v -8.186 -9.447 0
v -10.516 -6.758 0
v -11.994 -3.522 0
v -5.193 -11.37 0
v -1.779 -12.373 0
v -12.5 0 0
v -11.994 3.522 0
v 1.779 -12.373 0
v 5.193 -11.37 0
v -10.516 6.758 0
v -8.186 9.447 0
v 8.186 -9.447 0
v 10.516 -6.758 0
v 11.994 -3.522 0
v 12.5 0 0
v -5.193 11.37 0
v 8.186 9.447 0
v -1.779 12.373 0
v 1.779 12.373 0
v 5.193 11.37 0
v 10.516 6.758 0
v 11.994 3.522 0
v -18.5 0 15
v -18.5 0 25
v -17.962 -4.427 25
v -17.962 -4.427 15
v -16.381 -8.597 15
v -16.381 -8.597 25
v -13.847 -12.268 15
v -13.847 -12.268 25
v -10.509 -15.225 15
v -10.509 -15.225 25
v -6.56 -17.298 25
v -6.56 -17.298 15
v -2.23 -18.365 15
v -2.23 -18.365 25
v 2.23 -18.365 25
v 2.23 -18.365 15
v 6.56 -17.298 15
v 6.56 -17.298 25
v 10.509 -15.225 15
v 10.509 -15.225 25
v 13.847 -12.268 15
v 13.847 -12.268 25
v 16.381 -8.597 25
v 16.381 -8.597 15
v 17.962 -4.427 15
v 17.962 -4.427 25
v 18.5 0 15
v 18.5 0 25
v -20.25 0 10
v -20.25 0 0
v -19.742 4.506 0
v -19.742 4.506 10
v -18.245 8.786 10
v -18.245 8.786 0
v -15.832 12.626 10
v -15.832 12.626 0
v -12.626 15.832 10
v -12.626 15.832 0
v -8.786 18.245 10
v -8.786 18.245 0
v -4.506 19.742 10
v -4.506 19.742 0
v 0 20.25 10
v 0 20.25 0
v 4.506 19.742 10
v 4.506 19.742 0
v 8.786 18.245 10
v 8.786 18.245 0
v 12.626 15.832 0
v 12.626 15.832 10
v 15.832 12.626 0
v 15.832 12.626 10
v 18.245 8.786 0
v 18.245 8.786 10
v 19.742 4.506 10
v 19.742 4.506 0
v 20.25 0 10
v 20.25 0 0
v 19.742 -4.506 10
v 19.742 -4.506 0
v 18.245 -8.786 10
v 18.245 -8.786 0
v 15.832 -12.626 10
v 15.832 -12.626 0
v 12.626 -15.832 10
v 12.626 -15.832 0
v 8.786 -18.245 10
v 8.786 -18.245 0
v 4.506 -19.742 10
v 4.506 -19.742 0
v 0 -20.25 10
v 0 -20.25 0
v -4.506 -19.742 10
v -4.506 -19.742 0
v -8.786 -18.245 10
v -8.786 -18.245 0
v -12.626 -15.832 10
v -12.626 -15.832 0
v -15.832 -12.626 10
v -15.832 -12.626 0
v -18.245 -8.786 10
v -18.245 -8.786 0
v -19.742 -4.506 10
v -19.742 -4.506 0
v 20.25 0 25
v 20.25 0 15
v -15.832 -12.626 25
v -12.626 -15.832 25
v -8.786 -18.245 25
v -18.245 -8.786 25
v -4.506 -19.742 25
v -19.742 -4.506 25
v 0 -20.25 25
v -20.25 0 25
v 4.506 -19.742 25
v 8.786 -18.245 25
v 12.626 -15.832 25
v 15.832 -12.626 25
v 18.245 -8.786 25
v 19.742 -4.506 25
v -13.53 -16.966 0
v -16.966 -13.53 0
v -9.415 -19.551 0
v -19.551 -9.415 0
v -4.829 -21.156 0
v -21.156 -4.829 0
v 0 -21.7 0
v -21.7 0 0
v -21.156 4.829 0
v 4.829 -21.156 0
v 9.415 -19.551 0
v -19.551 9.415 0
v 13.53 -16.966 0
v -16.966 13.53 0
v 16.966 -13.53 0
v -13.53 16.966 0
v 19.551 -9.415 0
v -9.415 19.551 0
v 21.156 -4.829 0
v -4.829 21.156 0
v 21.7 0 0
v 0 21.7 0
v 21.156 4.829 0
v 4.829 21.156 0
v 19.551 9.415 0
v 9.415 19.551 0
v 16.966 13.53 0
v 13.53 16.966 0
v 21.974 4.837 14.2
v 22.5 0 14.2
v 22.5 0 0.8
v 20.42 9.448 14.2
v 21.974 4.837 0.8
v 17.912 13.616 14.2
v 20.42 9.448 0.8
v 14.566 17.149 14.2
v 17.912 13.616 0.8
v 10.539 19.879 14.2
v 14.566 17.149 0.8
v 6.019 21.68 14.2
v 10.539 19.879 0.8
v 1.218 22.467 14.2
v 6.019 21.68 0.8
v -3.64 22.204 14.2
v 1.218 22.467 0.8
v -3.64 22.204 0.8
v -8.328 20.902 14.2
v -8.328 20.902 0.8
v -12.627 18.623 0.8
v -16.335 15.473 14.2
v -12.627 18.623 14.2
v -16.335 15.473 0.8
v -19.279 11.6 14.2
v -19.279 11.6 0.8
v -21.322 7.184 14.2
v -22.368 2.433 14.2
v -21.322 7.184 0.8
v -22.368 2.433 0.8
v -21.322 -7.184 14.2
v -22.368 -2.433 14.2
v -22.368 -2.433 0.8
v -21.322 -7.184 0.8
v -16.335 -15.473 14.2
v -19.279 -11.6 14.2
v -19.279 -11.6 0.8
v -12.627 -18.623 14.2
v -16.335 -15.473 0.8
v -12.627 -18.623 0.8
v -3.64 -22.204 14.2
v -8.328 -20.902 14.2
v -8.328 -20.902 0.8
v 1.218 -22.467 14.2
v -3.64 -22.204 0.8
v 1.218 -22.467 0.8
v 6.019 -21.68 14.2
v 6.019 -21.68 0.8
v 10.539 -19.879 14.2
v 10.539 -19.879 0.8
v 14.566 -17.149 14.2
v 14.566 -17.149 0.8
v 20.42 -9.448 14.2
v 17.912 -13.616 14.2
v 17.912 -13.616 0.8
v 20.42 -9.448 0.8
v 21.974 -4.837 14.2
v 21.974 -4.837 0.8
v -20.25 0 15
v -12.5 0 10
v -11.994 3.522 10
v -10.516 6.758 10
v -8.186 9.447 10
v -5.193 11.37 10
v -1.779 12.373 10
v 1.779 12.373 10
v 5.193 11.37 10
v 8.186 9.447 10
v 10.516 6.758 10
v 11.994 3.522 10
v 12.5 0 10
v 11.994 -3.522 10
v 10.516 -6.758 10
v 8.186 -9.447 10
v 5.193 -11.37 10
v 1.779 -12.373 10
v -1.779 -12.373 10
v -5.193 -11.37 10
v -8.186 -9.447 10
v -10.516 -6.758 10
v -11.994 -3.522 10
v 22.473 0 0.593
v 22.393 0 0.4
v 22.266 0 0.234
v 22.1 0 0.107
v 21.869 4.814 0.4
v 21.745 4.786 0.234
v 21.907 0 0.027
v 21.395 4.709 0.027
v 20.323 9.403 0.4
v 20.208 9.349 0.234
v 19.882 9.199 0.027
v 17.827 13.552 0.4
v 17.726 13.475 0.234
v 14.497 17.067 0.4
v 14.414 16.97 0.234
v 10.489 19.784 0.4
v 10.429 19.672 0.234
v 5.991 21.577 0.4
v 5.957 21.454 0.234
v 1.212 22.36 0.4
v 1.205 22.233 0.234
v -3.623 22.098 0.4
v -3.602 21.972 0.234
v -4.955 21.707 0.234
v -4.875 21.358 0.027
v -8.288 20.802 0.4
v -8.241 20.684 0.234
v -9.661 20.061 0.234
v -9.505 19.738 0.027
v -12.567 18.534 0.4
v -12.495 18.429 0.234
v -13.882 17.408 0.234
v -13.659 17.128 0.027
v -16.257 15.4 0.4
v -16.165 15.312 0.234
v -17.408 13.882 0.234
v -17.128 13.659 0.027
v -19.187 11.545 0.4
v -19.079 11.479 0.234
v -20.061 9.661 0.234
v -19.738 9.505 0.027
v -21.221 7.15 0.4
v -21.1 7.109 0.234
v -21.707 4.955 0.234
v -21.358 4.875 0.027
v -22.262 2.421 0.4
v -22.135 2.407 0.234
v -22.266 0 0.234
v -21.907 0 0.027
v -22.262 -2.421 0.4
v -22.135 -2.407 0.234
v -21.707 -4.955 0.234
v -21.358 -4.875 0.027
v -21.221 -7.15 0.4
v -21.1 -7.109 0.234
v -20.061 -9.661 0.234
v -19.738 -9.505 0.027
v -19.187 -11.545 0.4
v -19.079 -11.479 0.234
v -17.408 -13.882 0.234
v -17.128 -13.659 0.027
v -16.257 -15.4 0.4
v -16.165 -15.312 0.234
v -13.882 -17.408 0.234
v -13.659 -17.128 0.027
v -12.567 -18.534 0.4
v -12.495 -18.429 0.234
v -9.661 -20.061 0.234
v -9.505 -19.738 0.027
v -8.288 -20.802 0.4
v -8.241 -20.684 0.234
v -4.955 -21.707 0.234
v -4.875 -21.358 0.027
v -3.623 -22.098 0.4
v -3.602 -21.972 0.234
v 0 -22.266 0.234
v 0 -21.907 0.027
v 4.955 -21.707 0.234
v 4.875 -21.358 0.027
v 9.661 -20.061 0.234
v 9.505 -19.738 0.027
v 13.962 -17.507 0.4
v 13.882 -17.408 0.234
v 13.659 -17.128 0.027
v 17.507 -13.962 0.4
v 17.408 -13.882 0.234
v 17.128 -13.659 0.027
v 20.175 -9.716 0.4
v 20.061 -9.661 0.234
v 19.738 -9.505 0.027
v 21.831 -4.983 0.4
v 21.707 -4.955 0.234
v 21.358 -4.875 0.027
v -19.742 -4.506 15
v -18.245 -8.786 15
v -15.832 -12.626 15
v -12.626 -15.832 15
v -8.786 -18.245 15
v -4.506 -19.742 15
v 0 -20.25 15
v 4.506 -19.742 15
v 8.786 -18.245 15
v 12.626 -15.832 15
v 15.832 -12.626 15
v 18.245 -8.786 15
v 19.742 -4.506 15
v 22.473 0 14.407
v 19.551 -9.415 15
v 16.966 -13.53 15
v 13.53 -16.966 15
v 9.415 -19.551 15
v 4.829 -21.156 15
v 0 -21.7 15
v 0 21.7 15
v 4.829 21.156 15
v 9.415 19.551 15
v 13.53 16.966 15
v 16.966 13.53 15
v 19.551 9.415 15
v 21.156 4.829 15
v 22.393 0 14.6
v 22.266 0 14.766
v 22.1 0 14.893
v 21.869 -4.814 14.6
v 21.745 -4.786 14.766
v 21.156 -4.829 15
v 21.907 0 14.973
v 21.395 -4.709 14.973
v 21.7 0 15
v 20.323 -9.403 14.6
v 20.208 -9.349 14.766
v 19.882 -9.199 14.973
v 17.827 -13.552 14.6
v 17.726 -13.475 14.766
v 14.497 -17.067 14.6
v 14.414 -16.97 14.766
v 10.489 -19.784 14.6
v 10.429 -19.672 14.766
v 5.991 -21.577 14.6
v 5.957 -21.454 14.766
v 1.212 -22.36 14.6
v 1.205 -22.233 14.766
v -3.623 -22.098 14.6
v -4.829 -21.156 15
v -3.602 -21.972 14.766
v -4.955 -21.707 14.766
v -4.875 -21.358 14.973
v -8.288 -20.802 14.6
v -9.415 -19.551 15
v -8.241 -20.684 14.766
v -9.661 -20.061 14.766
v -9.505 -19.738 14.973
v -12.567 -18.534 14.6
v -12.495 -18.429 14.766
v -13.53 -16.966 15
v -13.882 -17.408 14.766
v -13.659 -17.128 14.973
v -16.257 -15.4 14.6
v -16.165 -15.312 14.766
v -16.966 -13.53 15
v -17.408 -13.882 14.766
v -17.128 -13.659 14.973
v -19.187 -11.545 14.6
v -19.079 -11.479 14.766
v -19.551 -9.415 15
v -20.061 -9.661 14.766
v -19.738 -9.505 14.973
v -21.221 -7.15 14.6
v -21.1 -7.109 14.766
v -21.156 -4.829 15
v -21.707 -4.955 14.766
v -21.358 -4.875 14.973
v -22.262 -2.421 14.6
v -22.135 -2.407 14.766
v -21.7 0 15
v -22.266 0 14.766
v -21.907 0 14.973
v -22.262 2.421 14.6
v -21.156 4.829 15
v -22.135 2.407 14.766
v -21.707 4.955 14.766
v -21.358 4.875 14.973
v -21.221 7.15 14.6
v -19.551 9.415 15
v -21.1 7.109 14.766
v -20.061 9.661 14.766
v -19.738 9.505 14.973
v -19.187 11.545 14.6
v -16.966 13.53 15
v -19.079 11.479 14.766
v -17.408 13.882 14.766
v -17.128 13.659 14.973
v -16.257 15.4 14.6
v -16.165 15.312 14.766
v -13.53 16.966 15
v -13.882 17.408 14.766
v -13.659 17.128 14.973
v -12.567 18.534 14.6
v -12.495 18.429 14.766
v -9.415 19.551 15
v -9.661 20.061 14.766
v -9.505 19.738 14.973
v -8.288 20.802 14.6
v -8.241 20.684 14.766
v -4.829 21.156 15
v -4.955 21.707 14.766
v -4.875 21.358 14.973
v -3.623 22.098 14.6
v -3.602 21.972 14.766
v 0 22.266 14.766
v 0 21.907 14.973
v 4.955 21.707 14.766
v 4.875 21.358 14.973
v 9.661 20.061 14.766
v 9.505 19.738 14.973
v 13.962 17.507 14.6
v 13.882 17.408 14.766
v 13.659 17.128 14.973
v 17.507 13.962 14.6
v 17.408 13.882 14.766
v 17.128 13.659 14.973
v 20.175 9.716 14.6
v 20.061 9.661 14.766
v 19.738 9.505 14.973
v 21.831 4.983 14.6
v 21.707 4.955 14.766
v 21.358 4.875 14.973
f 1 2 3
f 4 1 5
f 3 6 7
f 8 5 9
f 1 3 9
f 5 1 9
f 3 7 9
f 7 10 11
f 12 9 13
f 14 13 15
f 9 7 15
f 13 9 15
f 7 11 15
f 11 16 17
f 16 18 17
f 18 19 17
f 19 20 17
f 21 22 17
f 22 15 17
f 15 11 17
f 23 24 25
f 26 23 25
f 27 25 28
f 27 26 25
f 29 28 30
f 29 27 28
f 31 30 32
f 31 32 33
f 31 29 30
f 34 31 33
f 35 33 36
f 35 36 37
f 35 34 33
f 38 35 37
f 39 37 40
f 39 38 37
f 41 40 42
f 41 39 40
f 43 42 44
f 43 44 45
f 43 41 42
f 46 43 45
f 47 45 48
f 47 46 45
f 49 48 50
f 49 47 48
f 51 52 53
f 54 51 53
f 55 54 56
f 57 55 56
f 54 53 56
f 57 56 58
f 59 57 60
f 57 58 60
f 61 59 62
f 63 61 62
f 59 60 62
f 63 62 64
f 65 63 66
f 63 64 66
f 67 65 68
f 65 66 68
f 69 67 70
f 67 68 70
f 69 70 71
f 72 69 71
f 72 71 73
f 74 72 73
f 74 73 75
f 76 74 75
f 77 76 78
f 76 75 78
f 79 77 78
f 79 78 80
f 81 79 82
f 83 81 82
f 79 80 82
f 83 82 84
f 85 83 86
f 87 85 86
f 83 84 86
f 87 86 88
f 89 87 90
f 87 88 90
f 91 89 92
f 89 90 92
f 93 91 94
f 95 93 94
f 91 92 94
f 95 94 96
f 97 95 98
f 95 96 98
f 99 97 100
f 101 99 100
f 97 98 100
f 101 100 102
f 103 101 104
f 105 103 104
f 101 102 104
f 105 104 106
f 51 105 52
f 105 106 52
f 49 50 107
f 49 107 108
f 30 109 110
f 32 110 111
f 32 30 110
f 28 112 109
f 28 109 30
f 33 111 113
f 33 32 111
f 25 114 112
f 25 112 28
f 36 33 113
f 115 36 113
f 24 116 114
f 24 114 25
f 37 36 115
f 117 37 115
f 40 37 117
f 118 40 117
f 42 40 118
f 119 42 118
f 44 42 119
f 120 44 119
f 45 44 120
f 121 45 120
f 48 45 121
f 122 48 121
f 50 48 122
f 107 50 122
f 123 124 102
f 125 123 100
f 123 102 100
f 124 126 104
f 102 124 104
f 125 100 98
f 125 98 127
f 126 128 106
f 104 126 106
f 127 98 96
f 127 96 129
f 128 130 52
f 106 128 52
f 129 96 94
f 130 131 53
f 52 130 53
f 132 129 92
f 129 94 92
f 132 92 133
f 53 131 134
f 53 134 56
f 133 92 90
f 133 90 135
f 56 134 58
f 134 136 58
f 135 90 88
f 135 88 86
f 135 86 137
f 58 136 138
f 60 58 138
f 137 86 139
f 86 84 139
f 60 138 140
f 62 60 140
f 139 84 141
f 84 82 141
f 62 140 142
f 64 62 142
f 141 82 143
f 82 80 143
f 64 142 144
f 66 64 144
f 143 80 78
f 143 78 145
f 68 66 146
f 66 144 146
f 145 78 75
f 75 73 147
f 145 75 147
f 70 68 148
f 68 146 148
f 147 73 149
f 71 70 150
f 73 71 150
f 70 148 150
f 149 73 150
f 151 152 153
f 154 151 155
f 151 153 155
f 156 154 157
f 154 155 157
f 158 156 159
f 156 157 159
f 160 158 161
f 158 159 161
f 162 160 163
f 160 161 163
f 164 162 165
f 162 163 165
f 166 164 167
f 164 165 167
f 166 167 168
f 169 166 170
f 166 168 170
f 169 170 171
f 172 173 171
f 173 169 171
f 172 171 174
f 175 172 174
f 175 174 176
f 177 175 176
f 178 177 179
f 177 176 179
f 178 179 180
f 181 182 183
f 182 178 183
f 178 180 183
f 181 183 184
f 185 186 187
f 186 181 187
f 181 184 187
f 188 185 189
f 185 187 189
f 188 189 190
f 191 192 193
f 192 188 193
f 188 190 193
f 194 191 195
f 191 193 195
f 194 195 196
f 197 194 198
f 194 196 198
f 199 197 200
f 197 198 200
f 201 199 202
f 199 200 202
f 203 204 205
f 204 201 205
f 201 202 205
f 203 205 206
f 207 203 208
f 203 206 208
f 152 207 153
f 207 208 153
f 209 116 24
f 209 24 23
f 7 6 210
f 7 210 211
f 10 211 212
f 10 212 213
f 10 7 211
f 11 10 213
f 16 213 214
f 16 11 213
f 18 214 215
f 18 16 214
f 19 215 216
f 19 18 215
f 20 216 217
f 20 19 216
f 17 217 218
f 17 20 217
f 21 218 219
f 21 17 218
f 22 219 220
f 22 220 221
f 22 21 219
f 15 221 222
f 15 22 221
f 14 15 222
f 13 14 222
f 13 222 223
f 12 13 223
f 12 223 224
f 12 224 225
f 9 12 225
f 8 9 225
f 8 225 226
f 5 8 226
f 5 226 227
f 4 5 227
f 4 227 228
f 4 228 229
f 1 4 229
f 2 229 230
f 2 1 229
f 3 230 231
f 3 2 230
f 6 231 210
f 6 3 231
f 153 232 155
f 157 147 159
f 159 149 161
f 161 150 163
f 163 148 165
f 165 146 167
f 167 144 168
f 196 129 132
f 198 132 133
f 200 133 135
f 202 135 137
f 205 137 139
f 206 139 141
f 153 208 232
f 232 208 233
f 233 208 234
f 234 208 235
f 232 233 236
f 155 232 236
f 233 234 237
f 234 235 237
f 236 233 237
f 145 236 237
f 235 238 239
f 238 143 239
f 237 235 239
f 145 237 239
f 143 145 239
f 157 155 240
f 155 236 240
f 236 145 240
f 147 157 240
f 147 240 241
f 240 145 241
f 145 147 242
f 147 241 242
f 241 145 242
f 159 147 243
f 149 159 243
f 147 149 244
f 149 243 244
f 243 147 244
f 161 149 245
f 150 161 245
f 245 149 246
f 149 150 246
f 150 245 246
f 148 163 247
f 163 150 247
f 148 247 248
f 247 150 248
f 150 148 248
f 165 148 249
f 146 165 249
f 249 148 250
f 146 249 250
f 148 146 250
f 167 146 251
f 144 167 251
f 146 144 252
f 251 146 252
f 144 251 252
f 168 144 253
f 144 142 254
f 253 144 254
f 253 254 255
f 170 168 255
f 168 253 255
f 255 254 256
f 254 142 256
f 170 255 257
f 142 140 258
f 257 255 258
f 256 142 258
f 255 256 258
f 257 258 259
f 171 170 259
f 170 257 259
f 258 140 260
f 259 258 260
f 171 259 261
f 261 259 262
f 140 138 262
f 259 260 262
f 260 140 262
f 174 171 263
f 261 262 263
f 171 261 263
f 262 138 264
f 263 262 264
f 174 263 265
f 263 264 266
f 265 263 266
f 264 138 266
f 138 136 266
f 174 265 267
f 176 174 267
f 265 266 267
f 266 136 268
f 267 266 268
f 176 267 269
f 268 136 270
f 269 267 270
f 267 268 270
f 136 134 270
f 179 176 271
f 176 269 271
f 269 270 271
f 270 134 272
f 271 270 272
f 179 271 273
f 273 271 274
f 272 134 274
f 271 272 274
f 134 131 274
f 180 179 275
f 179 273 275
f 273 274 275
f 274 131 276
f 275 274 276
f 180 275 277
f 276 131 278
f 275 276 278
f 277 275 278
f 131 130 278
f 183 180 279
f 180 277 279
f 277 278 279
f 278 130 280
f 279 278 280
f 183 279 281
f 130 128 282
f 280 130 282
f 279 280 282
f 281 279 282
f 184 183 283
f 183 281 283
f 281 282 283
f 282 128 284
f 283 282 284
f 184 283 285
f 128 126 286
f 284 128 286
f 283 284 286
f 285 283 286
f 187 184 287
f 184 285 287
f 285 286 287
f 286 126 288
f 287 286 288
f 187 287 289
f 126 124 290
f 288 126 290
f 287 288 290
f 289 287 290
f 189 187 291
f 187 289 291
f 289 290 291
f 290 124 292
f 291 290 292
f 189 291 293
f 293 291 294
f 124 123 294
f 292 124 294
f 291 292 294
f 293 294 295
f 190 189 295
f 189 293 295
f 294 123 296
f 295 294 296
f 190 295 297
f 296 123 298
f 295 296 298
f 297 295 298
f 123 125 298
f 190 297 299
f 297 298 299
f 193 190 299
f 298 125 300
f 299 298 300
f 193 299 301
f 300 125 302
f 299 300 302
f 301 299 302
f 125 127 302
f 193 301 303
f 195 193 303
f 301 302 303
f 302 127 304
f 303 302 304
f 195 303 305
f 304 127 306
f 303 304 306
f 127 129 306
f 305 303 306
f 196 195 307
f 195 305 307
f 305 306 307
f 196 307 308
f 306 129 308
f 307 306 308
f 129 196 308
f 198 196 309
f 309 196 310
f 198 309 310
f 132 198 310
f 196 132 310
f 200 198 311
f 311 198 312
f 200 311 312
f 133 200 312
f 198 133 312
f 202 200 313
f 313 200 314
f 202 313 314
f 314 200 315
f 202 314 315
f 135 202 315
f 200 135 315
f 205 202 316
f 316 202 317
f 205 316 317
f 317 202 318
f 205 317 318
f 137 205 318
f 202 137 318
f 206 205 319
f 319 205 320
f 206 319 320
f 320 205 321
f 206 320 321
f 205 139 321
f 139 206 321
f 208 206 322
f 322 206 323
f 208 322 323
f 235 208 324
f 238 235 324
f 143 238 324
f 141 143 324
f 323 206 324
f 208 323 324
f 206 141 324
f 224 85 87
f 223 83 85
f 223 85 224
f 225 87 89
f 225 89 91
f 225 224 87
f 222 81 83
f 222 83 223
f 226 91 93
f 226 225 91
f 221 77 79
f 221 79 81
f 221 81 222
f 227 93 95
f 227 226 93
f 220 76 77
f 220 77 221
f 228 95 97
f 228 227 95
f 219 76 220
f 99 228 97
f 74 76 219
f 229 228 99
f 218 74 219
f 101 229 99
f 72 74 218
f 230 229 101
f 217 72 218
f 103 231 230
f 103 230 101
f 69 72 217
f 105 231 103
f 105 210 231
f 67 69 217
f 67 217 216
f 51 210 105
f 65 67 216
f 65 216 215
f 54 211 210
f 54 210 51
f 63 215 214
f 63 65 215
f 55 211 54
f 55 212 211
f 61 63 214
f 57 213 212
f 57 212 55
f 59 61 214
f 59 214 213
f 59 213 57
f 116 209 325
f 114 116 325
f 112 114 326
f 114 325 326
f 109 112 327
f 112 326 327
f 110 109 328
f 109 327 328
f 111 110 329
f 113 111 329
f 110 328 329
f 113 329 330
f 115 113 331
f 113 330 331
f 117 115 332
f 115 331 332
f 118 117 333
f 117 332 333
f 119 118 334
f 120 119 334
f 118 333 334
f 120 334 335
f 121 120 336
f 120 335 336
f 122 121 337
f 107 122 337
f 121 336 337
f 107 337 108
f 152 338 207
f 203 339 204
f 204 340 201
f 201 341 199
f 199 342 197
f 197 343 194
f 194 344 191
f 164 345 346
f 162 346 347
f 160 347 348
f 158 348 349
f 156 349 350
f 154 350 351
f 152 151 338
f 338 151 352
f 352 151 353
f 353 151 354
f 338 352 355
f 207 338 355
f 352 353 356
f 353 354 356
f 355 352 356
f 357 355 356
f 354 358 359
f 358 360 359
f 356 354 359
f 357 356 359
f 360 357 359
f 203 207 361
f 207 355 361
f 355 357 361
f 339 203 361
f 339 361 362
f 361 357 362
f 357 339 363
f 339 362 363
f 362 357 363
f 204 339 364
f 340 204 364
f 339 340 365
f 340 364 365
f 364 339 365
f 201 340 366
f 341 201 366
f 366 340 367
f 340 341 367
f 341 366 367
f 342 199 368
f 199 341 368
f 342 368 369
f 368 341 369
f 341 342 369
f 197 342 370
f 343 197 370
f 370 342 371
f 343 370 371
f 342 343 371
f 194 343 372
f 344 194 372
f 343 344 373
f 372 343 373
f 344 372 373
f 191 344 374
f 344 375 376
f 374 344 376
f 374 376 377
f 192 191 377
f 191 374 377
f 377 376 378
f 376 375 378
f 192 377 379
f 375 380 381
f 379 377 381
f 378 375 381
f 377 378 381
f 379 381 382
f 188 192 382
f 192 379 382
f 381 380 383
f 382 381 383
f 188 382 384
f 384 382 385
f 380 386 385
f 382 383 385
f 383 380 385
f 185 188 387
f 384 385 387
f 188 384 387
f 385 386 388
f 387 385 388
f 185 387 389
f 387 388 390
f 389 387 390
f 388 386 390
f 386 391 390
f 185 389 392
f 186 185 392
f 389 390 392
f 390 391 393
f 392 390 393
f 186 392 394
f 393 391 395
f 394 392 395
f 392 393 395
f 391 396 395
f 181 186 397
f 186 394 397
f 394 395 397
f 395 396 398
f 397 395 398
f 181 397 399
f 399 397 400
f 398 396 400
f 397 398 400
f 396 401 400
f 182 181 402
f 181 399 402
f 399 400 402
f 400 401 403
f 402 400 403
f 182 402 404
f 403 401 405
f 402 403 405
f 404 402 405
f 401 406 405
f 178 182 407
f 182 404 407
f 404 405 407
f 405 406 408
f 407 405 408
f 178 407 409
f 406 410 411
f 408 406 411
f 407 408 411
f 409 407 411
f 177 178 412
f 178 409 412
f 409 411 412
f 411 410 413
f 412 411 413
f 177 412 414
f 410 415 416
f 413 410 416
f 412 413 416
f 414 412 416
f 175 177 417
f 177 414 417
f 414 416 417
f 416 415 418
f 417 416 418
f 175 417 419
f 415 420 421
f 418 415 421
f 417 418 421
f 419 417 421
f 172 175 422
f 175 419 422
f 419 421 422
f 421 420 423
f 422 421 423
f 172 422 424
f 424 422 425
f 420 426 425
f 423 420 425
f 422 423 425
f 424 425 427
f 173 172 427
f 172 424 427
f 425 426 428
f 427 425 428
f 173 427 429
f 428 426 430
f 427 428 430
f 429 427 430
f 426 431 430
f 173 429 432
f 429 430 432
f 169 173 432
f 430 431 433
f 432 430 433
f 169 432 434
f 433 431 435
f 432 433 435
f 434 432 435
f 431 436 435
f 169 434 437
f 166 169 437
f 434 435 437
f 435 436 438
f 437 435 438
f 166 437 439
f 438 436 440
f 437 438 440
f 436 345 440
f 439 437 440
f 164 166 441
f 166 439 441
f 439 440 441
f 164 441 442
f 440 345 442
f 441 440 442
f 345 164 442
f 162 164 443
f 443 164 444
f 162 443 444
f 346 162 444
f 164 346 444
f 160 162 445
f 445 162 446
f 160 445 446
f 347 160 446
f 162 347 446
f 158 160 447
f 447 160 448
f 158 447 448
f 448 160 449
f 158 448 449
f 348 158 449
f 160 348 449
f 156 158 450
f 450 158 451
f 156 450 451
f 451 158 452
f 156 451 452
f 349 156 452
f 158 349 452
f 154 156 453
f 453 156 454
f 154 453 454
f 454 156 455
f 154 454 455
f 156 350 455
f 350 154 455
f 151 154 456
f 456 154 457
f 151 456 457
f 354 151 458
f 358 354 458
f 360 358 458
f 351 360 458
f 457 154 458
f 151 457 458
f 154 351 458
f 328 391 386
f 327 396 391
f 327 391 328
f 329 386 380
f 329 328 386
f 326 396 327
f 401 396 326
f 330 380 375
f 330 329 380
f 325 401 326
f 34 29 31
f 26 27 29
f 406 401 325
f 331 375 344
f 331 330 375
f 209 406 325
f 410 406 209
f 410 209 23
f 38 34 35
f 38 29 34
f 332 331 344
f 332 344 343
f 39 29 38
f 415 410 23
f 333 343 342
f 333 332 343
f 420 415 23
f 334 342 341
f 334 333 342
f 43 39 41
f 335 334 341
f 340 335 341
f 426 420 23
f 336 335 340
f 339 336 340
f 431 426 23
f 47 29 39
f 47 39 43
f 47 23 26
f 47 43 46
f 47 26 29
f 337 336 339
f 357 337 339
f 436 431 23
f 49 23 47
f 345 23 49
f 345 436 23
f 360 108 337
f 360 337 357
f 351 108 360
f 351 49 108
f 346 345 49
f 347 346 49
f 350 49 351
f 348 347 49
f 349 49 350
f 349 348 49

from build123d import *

# Parameters (mm, degrees)
SKETCH1_R               = 22.5
BOSS_EXTRUDE1_DEPTH     = 15
SKETCH2_R               = 20.25
SKETCH2_R_2             = 18.5
BOSS_EXTRUDE2_DEPTH     = 10
CUT_EXTRUDE1_DEPTH      = 41.466035141
CUT_EXTRUDE1_DEPTH_BACK = 41.466035141
SKETCH4_W               = 10
SKETCH4_H               = 24.752073401
FILLET1_R               = 0.8
SKETCH5_R               = 20.25
SKETCH5_R_2             = 12.5
CUT_EXTRUDE2_DEPTH      = 10


with BuildPart() as part:
    # Sketch1 → Boss-Extrude1 (new body)
    with BuildSketch(Plane.XY):
        Circle(SKETCH1_R)
    extrude(amount=BOSS_EXTRUDE1_DEPTH)

    # Sketch2 → Boss-Extrude2 (add)
    with BuildSketch(Plane.XY.offset(15)):
        Circle(SKETCH2_R)
        Circle(SKETCH2_R_2, mode=Mode.SUBTRACT)
    extrude(amount=BOSS_EXTRUDE2_DEPTH)

    # Sketch4 → Cut-Extrude1 (cut, two sides: drawn at the far end of the back side and taken through both)
    with BuildSketch(Plane(origin=(0, 0, 0), x_dir=(0, 0, -1), z_dir=(1, 0, 0)).offset(-CUT_EXTRUDE1_DEPTH_BACK)):
        with Locations((-20, 12.376036701)):
            Rectangle(SKETCH4_W, SKETCH4_H)
    extrude(amount=CUT_EXTRUDE1_DEPTH + CUT_EXTRUDE1_DEPTH_BACK, mode=Mode.SUBTRACT)

    # Fillet1
    fillet1_edges = [part.edges().sort_by_distance(p)[0] for p in [
        (-22.5, 0, 0),
        (-22.5, 0, 15),
    ]]
    fillet(fillet1_edges, radius=FILLET1_R)

    # Sketch5 → Cut-Extrude2 (cut)
    with BuildSketch(Plane(origin=(0, 0, 0), x_dir=(-1, 0, 0), z_dir=(0, 0, -1))):
        Circle(SKETCH5_R)
        Circle(SKETCH5_R_2, mode=Mode.SUBTRACT)
    extrude(amount=-CUT_EXTRUDE2_DEPTH, mode=Mode.SUBTRACT)


solid = part.part
